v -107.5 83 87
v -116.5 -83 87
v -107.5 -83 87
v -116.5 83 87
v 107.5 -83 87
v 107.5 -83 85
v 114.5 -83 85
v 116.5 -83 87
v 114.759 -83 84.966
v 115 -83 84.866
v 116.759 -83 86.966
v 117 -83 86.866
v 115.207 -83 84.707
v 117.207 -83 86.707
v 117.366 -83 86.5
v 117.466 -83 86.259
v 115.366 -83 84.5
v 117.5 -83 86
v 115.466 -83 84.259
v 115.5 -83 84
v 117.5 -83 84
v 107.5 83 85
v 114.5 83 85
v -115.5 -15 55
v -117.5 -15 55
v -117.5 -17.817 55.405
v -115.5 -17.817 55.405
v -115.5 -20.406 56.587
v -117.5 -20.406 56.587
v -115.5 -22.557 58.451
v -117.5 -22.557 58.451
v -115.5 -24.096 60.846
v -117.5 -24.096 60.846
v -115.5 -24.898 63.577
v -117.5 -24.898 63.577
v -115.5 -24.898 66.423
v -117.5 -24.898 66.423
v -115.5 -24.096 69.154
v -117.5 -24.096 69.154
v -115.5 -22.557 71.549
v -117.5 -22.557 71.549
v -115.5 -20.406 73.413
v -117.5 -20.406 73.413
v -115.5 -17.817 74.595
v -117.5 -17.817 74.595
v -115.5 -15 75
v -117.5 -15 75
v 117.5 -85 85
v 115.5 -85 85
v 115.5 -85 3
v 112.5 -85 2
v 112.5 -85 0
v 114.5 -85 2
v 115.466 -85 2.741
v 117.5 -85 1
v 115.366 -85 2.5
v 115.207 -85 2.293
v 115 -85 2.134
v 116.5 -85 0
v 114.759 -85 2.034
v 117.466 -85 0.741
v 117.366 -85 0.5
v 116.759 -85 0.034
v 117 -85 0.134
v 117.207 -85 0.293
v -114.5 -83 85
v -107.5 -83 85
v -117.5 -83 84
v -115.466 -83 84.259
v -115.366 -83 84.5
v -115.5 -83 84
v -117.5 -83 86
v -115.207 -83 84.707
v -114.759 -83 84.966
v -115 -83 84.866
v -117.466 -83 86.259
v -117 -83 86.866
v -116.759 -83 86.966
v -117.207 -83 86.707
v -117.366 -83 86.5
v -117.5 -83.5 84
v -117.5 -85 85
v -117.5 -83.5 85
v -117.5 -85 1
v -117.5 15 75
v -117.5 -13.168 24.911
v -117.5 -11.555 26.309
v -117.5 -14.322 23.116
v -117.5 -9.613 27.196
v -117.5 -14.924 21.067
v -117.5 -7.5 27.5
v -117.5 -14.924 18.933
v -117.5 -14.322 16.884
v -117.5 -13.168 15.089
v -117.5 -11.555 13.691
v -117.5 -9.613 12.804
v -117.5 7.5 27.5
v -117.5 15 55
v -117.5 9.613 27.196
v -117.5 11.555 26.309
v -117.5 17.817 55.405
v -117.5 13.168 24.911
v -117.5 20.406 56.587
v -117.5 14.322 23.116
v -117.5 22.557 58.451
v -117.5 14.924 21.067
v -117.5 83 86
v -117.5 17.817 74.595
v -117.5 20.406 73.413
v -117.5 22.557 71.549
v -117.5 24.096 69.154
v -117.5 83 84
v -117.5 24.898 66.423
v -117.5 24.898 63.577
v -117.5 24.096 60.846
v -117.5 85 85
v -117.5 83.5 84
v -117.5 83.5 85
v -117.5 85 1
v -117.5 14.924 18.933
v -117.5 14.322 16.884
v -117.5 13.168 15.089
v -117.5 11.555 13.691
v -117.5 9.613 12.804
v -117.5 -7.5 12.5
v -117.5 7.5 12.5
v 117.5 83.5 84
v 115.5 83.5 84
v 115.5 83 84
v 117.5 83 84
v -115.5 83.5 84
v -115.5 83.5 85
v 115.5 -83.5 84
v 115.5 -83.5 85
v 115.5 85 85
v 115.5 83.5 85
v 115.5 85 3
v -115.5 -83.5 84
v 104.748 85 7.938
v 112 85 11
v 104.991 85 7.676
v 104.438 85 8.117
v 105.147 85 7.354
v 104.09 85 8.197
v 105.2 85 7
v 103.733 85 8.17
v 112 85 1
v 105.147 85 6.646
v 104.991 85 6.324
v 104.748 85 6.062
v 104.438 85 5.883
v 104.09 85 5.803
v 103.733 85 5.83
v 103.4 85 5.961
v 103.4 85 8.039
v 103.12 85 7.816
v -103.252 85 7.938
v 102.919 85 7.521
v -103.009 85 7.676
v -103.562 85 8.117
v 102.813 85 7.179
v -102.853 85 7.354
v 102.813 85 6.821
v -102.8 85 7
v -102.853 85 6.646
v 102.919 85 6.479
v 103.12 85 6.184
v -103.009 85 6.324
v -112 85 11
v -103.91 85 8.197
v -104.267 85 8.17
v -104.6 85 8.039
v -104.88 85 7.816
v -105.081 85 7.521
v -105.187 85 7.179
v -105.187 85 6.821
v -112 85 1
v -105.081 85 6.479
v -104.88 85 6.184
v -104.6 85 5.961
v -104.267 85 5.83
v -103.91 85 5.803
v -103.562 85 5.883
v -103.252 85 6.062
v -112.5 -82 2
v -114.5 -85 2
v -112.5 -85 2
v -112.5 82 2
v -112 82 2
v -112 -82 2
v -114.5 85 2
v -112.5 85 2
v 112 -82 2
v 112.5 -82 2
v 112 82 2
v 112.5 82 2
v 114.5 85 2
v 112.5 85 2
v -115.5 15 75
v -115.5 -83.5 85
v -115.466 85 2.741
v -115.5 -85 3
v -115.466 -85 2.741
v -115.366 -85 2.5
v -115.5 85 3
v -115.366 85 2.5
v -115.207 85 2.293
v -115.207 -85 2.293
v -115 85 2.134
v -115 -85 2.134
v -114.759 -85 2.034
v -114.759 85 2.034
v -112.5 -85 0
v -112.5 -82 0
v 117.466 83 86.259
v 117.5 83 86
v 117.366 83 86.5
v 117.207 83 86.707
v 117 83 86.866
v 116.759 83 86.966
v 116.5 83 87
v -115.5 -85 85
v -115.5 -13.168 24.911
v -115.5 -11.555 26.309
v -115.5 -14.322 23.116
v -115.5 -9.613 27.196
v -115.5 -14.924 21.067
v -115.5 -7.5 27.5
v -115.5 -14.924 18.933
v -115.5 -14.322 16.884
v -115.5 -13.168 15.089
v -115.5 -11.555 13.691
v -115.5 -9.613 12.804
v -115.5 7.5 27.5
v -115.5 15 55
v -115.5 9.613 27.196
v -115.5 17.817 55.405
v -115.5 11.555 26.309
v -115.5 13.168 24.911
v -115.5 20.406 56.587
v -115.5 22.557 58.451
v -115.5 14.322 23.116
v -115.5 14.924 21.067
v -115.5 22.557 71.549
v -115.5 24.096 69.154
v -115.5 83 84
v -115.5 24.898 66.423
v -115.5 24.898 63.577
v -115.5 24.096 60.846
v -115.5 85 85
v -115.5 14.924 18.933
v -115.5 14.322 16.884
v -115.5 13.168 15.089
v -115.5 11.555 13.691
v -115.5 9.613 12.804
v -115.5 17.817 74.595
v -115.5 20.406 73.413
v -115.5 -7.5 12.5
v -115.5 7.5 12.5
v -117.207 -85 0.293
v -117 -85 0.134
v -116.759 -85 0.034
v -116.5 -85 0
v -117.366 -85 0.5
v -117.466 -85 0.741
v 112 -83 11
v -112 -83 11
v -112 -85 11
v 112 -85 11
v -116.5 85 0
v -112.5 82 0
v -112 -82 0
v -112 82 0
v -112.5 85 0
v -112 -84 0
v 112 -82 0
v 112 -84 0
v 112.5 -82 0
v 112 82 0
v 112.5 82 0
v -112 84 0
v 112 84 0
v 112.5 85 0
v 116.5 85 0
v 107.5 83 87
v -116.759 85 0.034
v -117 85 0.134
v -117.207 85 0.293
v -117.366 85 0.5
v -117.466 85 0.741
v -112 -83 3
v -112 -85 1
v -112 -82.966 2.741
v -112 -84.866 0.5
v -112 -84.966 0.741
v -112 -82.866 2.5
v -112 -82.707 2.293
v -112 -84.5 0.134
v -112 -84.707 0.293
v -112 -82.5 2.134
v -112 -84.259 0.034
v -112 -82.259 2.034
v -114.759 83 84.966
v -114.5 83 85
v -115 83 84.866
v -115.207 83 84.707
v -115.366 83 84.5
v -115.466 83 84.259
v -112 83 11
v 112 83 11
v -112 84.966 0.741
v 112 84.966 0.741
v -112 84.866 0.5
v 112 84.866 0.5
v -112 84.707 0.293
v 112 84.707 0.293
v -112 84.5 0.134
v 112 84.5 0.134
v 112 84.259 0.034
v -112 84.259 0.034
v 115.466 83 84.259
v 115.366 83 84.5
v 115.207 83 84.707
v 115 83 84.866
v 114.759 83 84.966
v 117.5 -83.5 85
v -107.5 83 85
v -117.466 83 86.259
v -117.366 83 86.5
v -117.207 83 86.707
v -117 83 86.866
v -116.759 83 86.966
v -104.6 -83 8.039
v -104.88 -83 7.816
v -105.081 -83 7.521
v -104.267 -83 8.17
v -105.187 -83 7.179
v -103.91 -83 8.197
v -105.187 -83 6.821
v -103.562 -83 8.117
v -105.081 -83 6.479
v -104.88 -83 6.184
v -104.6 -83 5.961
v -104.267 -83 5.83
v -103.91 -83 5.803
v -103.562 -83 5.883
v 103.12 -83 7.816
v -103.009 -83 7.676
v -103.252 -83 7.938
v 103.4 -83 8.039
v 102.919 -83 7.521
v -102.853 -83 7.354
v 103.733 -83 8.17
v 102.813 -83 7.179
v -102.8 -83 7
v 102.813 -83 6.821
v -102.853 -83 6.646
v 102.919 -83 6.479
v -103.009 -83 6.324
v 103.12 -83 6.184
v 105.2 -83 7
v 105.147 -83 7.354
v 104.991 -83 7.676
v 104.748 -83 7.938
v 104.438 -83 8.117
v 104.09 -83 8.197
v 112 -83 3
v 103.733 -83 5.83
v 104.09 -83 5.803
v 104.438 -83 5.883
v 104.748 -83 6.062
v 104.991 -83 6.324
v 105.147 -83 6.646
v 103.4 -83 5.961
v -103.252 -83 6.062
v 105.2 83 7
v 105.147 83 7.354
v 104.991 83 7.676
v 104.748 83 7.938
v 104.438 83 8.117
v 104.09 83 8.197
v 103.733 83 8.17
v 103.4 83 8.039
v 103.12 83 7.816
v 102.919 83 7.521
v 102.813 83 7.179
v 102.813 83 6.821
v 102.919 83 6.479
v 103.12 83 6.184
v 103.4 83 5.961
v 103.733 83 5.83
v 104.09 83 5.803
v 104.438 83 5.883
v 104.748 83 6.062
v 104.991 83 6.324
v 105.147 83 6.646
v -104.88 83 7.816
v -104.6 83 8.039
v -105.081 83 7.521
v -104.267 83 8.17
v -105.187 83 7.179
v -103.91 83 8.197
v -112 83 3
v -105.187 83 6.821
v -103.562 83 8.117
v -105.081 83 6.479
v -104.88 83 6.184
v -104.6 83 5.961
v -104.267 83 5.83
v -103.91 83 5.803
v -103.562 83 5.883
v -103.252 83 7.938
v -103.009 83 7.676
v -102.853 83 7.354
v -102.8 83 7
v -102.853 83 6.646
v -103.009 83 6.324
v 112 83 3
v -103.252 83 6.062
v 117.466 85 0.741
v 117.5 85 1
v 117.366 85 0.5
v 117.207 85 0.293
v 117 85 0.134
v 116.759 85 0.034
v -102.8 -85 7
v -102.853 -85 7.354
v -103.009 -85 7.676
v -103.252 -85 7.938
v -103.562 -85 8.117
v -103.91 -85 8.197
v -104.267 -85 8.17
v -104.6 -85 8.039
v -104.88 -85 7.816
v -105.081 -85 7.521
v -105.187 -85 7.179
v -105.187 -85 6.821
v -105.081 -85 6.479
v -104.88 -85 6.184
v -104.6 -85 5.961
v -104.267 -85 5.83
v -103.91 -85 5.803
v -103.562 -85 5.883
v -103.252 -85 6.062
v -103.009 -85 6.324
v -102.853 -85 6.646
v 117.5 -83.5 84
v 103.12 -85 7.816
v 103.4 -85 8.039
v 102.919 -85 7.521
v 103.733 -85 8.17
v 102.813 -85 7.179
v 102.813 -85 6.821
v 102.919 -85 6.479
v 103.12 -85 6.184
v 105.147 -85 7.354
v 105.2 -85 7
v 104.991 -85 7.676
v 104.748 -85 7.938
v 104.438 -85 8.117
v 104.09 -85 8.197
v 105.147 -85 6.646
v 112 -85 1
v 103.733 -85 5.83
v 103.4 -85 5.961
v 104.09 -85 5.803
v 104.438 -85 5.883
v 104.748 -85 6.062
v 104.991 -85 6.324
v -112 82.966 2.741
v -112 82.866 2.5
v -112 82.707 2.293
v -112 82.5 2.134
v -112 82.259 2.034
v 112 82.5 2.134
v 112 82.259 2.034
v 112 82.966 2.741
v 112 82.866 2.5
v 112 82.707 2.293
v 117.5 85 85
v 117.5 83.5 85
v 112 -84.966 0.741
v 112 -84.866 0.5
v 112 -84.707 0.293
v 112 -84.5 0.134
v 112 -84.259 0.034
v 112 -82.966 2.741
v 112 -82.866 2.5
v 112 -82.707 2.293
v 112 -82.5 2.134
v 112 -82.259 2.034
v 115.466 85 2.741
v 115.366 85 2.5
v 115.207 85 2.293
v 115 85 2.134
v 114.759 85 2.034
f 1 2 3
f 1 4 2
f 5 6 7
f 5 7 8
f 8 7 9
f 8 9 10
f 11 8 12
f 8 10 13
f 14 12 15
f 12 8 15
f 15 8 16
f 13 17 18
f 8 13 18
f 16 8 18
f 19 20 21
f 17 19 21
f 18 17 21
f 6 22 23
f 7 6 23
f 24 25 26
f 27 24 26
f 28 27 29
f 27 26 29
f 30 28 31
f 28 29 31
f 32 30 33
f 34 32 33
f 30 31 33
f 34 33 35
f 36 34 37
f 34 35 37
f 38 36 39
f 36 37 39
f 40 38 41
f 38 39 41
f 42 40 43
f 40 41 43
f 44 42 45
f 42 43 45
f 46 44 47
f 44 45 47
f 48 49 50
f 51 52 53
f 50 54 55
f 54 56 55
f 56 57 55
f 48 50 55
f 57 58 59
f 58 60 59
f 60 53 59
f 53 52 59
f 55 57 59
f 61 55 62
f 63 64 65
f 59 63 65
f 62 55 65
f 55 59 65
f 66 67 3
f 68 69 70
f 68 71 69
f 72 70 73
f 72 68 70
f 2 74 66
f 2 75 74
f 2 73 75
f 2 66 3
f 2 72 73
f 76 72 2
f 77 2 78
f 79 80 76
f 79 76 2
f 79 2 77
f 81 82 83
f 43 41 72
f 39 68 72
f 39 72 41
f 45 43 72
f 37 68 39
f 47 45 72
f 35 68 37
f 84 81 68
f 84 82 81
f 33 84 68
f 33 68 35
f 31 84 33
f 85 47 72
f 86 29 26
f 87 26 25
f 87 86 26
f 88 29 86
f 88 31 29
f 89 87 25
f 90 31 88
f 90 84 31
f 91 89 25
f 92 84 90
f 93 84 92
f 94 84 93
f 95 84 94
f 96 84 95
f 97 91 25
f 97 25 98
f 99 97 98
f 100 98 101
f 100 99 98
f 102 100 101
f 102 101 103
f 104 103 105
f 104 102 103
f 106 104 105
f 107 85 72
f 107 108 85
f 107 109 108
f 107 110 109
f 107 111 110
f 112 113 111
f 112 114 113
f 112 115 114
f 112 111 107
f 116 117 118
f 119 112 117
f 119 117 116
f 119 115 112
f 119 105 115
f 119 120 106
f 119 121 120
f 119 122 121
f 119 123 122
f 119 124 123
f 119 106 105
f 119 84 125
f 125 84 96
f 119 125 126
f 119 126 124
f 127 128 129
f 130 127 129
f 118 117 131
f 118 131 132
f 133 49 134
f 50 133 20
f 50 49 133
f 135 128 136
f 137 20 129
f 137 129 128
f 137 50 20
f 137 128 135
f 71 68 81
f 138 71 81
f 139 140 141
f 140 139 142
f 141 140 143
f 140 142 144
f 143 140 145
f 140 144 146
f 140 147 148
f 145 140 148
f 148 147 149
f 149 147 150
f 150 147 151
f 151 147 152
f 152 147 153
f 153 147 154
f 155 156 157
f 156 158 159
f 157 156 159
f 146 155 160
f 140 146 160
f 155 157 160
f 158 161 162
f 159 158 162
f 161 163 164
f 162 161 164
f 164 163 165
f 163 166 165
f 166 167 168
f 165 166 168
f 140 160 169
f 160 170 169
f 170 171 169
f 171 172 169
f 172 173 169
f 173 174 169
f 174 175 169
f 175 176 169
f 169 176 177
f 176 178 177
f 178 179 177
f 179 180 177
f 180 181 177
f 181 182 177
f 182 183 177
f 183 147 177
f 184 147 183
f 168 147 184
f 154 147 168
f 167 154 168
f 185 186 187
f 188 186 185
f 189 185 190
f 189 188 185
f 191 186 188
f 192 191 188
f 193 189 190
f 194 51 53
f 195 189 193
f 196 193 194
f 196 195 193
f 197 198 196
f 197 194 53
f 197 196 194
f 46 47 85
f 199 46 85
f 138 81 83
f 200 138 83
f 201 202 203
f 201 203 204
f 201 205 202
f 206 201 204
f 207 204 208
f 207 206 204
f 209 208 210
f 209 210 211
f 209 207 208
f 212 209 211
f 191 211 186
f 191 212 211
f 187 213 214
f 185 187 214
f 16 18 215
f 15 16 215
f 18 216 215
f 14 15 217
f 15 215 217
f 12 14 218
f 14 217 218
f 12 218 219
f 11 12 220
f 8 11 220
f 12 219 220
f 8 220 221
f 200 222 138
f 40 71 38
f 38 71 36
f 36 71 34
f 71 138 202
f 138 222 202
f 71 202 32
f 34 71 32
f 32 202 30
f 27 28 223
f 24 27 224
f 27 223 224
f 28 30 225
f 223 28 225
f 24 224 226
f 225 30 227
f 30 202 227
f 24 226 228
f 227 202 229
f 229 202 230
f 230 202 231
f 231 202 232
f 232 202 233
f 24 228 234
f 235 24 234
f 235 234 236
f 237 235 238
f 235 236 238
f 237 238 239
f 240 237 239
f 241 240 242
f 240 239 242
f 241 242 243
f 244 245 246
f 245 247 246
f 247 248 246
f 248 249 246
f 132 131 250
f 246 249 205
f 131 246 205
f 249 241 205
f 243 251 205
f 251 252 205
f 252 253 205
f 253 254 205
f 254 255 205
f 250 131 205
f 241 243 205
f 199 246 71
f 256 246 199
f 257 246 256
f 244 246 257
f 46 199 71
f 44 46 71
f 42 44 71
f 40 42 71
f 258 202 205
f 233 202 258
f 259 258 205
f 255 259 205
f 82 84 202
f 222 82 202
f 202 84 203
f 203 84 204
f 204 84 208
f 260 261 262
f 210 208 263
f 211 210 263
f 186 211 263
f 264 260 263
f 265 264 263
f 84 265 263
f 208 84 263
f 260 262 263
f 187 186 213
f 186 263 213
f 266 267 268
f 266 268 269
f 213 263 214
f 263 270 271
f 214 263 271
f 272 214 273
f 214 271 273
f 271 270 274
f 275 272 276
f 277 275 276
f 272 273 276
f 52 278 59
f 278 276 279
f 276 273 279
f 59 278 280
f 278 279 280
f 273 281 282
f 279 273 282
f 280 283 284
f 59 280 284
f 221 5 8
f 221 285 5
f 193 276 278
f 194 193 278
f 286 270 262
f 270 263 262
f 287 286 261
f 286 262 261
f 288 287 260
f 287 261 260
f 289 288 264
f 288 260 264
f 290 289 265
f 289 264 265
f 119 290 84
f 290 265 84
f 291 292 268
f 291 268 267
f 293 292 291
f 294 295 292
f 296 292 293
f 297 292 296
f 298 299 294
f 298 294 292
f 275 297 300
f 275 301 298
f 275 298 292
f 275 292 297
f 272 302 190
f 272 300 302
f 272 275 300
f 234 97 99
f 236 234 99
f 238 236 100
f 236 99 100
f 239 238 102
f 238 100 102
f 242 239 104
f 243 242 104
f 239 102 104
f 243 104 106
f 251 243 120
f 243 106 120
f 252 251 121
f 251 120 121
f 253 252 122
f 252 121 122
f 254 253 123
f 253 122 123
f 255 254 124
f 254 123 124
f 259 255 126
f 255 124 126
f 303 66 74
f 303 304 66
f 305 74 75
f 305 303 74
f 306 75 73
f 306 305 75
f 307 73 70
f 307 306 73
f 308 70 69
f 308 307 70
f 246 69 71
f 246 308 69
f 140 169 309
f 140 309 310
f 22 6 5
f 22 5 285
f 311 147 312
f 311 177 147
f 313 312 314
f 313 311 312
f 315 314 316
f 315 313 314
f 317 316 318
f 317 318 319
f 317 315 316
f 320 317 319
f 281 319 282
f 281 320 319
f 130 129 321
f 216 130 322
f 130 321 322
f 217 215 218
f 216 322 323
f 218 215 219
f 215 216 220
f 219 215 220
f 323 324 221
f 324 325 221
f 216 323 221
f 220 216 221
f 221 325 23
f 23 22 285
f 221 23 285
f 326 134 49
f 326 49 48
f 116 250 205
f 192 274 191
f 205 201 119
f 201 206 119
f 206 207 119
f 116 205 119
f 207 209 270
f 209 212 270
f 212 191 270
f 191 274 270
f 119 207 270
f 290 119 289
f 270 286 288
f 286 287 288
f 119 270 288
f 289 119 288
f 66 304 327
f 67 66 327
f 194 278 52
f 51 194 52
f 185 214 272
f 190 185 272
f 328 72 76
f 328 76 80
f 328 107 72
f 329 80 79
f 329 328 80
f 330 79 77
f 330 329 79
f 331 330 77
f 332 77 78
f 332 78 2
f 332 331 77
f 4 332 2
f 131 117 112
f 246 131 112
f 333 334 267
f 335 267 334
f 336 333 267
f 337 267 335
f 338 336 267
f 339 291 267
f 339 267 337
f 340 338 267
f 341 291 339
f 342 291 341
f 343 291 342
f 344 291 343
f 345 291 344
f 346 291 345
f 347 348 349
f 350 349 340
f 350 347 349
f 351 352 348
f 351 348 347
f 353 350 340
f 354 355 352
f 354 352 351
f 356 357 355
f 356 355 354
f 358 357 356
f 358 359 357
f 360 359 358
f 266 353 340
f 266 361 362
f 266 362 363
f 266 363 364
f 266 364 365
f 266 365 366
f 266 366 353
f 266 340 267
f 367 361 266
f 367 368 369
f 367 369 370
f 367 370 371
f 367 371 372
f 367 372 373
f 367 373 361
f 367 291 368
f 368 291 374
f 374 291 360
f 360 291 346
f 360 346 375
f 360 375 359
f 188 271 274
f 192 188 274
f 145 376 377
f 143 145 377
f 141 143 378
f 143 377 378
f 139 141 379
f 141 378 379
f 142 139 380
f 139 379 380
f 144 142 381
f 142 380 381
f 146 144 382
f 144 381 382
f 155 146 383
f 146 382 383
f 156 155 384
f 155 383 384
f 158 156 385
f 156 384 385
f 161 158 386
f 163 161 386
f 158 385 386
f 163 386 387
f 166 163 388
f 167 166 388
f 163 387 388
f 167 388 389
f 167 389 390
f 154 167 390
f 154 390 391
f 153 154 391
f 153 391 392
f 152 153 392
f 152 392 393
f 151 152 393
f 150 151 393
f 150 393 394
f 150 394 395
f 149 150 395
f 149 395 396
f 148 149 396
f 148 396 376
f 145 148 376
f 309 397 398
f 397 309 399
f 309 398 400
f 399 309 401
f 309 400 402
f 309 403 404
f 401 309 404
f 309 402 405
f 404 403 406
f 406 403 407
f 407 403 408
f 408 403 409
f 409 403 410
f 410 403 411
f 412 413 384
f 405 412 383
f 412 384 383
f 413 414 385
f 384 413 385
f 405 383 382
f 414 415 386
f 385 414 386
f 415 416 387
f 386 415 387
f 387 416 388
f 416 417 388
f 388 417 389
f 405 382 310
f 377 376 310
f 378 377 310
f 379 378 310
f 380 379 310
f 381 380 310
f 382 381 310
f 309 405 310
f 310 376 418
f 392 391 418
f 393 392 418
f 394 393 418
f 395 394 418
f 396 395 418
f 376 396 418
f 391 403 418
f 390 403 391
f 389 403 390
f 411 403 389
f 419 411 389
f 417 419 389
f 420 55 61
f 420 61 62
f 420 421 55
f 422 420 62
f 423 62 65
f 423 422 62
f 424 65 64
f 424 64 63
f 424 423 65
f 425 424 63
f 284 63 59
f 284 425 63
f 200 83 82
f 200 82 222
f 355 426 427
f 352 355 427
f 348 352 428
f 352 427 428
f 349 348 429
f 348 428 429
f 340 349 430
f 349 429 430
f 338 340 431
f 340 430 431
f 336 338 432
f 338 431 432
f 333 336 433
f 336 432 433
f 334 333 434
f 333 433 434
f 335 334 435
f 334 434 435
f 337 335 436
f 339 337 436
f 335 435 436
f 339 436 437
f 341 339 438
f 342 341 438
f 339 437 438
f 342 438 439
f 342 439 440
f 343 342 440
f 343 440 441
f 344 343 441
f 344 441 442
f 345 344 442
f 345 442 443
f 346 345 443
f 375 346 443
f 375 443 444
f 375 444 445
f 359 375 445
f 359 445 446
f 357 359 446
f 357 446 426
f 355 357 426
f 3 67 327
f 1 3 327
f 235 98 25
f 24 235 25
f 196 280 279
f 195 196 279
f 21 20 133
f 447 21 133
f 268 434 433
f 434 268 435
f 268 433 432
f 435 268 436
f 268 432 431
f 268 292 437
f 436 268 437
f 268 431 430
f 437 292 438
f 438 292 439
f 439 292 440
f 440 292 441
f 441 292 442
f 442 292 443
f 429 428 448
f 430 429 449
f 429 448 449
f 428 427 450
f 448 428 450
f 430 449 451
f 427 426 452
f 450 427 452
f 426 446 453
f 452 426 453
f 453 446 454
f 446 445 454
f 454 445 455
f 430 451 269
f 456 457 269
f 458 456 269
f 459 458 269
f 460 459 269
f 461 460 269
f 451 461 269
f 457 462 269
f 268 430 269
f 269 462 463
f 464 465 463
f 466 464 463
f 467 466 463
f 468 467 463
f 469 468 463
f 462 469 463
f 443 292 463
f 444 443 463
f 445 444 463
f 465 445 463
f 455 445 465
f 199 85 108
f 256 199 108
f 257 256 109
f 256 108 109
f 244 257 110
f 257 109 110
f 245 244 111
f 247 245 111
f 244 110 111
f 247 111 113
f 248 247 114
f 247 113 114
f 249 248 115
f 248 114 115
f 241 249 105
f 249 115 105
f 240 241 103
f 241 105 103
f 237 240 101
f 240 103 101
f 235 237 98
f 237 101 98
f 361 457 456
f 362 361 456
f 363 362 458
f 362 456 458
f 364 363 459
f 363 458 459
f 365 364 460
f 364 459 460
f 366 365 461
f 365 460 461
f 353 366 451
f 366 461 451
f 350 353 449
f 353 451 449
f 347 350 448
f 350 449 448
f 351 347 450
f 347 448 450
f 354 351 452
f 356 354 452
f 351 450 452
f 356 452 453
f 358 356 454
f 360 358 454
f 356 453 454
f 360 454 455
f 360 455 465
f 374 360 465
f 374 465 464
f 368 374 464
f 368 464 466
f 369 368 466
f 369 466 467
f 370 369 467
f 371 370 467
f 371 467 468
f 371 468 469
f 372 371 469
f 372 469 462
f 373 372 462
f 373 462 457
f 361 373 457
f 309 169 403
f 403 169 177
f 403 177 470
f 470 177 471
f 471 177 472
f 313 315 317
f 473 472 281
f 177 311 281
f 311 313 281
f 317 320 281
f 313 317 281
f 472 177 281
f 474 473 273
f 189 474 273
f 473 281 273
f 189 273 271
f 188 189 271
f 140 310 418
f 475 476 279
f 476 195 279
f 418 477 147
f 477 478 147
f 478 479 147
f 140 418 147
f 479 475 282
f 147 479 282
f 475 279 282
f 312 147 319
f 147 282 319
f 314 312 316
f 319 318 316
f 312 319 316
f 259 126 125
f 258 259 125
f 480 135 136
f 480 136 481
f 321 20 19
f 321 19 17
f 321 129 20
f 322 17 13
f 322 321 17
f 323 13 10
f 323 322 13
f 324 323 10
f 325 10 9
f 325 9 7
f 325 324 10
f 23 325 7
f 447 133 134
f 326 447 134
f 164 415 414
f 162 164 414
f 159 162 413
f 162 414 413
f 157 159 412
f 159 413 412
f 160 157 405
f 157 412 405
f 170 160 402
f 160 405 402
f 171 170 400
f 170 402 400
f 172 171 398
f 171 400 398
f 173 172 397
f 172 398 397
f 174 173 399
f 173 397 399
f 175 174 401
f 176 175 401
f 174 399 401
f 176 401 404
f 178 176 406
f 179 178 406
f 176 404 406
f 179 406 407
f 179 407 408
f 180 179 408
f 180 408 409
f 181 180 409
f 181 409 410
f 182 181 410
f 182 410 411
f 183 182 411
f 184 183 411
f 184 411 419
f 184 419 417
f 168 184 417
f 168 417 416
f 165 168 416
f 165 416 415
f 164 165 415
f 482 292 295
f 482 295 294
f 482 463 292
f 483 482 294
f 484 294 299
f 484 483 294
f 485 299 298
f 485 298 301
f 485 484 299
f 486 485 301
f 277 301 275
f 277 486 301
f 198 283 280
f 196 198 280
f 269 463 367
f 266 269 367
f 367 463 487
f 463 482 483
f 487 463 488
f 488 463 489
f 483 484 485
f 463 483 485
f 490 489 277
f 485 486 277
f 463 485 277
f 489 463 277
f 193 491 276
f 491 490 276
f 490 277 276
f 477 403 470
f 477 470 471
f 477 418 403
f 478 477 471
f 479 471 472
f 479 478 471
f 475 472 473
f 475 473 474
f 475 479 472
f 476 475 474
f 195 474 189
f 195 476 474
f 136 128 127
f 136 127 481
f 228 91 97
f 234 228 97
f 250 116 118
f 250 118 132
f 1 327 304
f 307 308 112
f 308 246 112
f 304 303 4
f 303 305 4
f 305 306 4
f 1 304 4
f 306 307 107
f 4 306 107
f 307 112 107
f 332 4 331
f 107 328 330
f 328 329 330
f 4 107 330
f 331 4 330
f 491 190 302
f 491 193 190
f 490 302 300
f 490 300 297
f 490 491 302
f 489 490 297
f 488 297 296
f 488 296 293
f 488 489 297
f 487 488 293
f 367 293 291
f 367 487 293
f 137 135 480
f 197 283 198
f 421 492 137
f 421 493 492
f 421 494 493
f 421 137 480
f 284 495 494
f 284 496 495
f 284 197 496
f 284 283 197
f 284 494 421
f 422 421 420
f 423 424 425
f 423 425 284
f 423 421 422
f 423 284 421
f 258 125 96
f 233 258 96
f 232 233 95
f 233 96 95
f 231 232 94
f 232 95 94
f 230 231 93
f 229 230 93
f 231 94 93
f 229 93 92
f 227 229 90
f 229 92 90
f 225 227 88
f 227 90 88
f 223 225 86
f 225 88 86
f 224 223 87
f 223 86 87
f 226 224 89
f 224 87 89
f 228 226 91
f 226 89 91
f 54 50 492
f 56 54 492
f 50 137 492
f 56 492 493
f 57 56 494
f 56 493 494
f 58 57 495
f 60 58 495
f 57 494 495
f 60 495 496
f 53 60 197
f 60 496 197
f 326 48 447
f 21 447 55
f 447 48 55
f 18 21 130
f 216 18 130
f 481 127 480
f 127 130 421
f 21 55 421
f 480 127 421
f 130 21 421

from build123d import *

# Parameters (mm, degrees)
F1_DEPTH  = 2
F2_W      = 2
F2_H      = 170
F3_DEPTH  = 83
F4_R      = 1
F5_W      = 10
F5_H      = 166
F6_DEPTH  = 2
F7_R      = 1
F8_W      = 224
F8_H      = 2
F9_DEPTH  = 9
F10_R     = 1
F11_W     = 0.5
F11_H     = 1
F12_DEPTH = 235.001
F14_DEPTH = 3
F15_R     = 1.2
F16_DEPTH = 170.001


with BuildPart() as f1:
    # F0 (on Top) → F1 (new body)
    with BuildSketch(Plane.XY):
        Polygon((112.5, -85), (117.5, -85), (117.5, 85), (112.5, 85), (112.5, 82), (112, 82), (112, 85), (-112, 85), (-112, 82), (-112.5, 82), (-112.5, 85), (-117.5, 85), (-117.5, -85), (-112.5, -85), (-112.5, -82), (-112, -82), (-112, -85), (112, -85), (112, -82), (112.5, -82), align=None)
    extrude(amount=F1_DEPTH)

    # F2 (on face) → F3 (join)
    with BuildSketch(Plane.XY.offset(2)):
        with Locations((116.5, 0)):
            Rectangle(F2_W, F2_H)
        with Locations((-116.5, 0)):
            Rectangle(F2_W, F2_H)
    extrude(amount=F3_DEPTH)

    # F4
    f4_edges = [f1.edges().sort_by_distance(p)[0] for p in [
        (-117.5, 0, 0),
        (117.5, 0, 0),
        (-115.5, 0, 2),
        (115.5, 0, 2),
    ]]
    fillet(f4_edges, radius=F4_R)

    # F5 (on face) → F6 (join)
    with BuildSketch(Plane.XY.offset(85)):
        with Locations((-112.5, 0)):
            Rectangle(F5_W, F5_H)
        with Locations((112.5, 0)):
            Rectangle(F5_W, F5_H)
    extrude(amount=F6_DEPTH)

    # F7
    f7_edges = [f1.edges().sort_by_distance(p)[0] for p in [
        (-117.5, 0, 87),
        (117.5, 0, 87),
        (-115.5, 0, 85),
        (115.5, 0, 85),
    ]]
    fillet(f7_edges, radius=F7_R)

    # F8 (on face) → F9 (join)
    with BuildSketch(Plane.XY.offset(2)):
        with Locations((0, -84)):
            Rectangle(F8_W, F8_H)
        with Locations((0, 84)):
            Rectangle(F8_W, F8_H)
    extrude(amount=F9_DEPTH)

    # F10
    f10_edges = [f1.edges().sort_by_distance(p)[0] for p in [
        (0, -85, 0),
        (0, -83, 2),
        (0, 83, 2),
        (0, 85, 0),
    ]]
    fillet(f10_edges, radius=F10_R)

    # F11 (on face) → F12 (cut, through all)
    with BuildSketch(Plane(origin=(-117.5, 0, 0), x_dir=(0, -1, 0), z_dir=(-1, 0, 0))):
        with Locations((83.25, 84.5)):
            Rectangle(F11_W, F11_H)
        with Locations((-83.25, 84.5)):
            Rectangle(F11_W, F11_H)
    extrude(amount=-F12_DEPTH, mode=Mode.SUBTRACT)

    # F13 (on face) → F14 (cut)
    with BuildSketch(Plane(origin=(-117.5, 0, 0), x_dir=(0, -1, 0), z_dir=(-1, 0, 0))):
        with BuildLine():
            Line((-7.5, 12.5), (7.5, 12.5))
            ThreePointArc((7.5, 12.5), (15, 20), (7.5, 27.5))
            Line((7.5, 27.5), (-7.5, 27.5))
            ThreePointArc((-7.5, 27.5), (-15, 20), (-7.5, 12.5))
        make_face()
        with BuildLine():
            Line((-15, 55), (15, 55))
            ThreePointArc((15, 55), (25, 65), (15, 75))
            Line((15, 75), (-15, 75))
            ThreePointArc((-15, 75), (-25, 65), (-15, 55))
        make_face()
    extrude(amount=-F14_DEPTH, mode=Mode.SUBTRACT)

    # F15 (on face) → F16 (cut, through all)
    with BuildSketch(Plane.XZ.offset(85)):
        with Locations((104, 7)):
            Circle(F15_R)
        with Locations((-104, 7)):
            Circle(F15_R)
    extrude(amount=-F16_DEPTH, mode=Mode.SUBTRACT)


solid = f1.part
